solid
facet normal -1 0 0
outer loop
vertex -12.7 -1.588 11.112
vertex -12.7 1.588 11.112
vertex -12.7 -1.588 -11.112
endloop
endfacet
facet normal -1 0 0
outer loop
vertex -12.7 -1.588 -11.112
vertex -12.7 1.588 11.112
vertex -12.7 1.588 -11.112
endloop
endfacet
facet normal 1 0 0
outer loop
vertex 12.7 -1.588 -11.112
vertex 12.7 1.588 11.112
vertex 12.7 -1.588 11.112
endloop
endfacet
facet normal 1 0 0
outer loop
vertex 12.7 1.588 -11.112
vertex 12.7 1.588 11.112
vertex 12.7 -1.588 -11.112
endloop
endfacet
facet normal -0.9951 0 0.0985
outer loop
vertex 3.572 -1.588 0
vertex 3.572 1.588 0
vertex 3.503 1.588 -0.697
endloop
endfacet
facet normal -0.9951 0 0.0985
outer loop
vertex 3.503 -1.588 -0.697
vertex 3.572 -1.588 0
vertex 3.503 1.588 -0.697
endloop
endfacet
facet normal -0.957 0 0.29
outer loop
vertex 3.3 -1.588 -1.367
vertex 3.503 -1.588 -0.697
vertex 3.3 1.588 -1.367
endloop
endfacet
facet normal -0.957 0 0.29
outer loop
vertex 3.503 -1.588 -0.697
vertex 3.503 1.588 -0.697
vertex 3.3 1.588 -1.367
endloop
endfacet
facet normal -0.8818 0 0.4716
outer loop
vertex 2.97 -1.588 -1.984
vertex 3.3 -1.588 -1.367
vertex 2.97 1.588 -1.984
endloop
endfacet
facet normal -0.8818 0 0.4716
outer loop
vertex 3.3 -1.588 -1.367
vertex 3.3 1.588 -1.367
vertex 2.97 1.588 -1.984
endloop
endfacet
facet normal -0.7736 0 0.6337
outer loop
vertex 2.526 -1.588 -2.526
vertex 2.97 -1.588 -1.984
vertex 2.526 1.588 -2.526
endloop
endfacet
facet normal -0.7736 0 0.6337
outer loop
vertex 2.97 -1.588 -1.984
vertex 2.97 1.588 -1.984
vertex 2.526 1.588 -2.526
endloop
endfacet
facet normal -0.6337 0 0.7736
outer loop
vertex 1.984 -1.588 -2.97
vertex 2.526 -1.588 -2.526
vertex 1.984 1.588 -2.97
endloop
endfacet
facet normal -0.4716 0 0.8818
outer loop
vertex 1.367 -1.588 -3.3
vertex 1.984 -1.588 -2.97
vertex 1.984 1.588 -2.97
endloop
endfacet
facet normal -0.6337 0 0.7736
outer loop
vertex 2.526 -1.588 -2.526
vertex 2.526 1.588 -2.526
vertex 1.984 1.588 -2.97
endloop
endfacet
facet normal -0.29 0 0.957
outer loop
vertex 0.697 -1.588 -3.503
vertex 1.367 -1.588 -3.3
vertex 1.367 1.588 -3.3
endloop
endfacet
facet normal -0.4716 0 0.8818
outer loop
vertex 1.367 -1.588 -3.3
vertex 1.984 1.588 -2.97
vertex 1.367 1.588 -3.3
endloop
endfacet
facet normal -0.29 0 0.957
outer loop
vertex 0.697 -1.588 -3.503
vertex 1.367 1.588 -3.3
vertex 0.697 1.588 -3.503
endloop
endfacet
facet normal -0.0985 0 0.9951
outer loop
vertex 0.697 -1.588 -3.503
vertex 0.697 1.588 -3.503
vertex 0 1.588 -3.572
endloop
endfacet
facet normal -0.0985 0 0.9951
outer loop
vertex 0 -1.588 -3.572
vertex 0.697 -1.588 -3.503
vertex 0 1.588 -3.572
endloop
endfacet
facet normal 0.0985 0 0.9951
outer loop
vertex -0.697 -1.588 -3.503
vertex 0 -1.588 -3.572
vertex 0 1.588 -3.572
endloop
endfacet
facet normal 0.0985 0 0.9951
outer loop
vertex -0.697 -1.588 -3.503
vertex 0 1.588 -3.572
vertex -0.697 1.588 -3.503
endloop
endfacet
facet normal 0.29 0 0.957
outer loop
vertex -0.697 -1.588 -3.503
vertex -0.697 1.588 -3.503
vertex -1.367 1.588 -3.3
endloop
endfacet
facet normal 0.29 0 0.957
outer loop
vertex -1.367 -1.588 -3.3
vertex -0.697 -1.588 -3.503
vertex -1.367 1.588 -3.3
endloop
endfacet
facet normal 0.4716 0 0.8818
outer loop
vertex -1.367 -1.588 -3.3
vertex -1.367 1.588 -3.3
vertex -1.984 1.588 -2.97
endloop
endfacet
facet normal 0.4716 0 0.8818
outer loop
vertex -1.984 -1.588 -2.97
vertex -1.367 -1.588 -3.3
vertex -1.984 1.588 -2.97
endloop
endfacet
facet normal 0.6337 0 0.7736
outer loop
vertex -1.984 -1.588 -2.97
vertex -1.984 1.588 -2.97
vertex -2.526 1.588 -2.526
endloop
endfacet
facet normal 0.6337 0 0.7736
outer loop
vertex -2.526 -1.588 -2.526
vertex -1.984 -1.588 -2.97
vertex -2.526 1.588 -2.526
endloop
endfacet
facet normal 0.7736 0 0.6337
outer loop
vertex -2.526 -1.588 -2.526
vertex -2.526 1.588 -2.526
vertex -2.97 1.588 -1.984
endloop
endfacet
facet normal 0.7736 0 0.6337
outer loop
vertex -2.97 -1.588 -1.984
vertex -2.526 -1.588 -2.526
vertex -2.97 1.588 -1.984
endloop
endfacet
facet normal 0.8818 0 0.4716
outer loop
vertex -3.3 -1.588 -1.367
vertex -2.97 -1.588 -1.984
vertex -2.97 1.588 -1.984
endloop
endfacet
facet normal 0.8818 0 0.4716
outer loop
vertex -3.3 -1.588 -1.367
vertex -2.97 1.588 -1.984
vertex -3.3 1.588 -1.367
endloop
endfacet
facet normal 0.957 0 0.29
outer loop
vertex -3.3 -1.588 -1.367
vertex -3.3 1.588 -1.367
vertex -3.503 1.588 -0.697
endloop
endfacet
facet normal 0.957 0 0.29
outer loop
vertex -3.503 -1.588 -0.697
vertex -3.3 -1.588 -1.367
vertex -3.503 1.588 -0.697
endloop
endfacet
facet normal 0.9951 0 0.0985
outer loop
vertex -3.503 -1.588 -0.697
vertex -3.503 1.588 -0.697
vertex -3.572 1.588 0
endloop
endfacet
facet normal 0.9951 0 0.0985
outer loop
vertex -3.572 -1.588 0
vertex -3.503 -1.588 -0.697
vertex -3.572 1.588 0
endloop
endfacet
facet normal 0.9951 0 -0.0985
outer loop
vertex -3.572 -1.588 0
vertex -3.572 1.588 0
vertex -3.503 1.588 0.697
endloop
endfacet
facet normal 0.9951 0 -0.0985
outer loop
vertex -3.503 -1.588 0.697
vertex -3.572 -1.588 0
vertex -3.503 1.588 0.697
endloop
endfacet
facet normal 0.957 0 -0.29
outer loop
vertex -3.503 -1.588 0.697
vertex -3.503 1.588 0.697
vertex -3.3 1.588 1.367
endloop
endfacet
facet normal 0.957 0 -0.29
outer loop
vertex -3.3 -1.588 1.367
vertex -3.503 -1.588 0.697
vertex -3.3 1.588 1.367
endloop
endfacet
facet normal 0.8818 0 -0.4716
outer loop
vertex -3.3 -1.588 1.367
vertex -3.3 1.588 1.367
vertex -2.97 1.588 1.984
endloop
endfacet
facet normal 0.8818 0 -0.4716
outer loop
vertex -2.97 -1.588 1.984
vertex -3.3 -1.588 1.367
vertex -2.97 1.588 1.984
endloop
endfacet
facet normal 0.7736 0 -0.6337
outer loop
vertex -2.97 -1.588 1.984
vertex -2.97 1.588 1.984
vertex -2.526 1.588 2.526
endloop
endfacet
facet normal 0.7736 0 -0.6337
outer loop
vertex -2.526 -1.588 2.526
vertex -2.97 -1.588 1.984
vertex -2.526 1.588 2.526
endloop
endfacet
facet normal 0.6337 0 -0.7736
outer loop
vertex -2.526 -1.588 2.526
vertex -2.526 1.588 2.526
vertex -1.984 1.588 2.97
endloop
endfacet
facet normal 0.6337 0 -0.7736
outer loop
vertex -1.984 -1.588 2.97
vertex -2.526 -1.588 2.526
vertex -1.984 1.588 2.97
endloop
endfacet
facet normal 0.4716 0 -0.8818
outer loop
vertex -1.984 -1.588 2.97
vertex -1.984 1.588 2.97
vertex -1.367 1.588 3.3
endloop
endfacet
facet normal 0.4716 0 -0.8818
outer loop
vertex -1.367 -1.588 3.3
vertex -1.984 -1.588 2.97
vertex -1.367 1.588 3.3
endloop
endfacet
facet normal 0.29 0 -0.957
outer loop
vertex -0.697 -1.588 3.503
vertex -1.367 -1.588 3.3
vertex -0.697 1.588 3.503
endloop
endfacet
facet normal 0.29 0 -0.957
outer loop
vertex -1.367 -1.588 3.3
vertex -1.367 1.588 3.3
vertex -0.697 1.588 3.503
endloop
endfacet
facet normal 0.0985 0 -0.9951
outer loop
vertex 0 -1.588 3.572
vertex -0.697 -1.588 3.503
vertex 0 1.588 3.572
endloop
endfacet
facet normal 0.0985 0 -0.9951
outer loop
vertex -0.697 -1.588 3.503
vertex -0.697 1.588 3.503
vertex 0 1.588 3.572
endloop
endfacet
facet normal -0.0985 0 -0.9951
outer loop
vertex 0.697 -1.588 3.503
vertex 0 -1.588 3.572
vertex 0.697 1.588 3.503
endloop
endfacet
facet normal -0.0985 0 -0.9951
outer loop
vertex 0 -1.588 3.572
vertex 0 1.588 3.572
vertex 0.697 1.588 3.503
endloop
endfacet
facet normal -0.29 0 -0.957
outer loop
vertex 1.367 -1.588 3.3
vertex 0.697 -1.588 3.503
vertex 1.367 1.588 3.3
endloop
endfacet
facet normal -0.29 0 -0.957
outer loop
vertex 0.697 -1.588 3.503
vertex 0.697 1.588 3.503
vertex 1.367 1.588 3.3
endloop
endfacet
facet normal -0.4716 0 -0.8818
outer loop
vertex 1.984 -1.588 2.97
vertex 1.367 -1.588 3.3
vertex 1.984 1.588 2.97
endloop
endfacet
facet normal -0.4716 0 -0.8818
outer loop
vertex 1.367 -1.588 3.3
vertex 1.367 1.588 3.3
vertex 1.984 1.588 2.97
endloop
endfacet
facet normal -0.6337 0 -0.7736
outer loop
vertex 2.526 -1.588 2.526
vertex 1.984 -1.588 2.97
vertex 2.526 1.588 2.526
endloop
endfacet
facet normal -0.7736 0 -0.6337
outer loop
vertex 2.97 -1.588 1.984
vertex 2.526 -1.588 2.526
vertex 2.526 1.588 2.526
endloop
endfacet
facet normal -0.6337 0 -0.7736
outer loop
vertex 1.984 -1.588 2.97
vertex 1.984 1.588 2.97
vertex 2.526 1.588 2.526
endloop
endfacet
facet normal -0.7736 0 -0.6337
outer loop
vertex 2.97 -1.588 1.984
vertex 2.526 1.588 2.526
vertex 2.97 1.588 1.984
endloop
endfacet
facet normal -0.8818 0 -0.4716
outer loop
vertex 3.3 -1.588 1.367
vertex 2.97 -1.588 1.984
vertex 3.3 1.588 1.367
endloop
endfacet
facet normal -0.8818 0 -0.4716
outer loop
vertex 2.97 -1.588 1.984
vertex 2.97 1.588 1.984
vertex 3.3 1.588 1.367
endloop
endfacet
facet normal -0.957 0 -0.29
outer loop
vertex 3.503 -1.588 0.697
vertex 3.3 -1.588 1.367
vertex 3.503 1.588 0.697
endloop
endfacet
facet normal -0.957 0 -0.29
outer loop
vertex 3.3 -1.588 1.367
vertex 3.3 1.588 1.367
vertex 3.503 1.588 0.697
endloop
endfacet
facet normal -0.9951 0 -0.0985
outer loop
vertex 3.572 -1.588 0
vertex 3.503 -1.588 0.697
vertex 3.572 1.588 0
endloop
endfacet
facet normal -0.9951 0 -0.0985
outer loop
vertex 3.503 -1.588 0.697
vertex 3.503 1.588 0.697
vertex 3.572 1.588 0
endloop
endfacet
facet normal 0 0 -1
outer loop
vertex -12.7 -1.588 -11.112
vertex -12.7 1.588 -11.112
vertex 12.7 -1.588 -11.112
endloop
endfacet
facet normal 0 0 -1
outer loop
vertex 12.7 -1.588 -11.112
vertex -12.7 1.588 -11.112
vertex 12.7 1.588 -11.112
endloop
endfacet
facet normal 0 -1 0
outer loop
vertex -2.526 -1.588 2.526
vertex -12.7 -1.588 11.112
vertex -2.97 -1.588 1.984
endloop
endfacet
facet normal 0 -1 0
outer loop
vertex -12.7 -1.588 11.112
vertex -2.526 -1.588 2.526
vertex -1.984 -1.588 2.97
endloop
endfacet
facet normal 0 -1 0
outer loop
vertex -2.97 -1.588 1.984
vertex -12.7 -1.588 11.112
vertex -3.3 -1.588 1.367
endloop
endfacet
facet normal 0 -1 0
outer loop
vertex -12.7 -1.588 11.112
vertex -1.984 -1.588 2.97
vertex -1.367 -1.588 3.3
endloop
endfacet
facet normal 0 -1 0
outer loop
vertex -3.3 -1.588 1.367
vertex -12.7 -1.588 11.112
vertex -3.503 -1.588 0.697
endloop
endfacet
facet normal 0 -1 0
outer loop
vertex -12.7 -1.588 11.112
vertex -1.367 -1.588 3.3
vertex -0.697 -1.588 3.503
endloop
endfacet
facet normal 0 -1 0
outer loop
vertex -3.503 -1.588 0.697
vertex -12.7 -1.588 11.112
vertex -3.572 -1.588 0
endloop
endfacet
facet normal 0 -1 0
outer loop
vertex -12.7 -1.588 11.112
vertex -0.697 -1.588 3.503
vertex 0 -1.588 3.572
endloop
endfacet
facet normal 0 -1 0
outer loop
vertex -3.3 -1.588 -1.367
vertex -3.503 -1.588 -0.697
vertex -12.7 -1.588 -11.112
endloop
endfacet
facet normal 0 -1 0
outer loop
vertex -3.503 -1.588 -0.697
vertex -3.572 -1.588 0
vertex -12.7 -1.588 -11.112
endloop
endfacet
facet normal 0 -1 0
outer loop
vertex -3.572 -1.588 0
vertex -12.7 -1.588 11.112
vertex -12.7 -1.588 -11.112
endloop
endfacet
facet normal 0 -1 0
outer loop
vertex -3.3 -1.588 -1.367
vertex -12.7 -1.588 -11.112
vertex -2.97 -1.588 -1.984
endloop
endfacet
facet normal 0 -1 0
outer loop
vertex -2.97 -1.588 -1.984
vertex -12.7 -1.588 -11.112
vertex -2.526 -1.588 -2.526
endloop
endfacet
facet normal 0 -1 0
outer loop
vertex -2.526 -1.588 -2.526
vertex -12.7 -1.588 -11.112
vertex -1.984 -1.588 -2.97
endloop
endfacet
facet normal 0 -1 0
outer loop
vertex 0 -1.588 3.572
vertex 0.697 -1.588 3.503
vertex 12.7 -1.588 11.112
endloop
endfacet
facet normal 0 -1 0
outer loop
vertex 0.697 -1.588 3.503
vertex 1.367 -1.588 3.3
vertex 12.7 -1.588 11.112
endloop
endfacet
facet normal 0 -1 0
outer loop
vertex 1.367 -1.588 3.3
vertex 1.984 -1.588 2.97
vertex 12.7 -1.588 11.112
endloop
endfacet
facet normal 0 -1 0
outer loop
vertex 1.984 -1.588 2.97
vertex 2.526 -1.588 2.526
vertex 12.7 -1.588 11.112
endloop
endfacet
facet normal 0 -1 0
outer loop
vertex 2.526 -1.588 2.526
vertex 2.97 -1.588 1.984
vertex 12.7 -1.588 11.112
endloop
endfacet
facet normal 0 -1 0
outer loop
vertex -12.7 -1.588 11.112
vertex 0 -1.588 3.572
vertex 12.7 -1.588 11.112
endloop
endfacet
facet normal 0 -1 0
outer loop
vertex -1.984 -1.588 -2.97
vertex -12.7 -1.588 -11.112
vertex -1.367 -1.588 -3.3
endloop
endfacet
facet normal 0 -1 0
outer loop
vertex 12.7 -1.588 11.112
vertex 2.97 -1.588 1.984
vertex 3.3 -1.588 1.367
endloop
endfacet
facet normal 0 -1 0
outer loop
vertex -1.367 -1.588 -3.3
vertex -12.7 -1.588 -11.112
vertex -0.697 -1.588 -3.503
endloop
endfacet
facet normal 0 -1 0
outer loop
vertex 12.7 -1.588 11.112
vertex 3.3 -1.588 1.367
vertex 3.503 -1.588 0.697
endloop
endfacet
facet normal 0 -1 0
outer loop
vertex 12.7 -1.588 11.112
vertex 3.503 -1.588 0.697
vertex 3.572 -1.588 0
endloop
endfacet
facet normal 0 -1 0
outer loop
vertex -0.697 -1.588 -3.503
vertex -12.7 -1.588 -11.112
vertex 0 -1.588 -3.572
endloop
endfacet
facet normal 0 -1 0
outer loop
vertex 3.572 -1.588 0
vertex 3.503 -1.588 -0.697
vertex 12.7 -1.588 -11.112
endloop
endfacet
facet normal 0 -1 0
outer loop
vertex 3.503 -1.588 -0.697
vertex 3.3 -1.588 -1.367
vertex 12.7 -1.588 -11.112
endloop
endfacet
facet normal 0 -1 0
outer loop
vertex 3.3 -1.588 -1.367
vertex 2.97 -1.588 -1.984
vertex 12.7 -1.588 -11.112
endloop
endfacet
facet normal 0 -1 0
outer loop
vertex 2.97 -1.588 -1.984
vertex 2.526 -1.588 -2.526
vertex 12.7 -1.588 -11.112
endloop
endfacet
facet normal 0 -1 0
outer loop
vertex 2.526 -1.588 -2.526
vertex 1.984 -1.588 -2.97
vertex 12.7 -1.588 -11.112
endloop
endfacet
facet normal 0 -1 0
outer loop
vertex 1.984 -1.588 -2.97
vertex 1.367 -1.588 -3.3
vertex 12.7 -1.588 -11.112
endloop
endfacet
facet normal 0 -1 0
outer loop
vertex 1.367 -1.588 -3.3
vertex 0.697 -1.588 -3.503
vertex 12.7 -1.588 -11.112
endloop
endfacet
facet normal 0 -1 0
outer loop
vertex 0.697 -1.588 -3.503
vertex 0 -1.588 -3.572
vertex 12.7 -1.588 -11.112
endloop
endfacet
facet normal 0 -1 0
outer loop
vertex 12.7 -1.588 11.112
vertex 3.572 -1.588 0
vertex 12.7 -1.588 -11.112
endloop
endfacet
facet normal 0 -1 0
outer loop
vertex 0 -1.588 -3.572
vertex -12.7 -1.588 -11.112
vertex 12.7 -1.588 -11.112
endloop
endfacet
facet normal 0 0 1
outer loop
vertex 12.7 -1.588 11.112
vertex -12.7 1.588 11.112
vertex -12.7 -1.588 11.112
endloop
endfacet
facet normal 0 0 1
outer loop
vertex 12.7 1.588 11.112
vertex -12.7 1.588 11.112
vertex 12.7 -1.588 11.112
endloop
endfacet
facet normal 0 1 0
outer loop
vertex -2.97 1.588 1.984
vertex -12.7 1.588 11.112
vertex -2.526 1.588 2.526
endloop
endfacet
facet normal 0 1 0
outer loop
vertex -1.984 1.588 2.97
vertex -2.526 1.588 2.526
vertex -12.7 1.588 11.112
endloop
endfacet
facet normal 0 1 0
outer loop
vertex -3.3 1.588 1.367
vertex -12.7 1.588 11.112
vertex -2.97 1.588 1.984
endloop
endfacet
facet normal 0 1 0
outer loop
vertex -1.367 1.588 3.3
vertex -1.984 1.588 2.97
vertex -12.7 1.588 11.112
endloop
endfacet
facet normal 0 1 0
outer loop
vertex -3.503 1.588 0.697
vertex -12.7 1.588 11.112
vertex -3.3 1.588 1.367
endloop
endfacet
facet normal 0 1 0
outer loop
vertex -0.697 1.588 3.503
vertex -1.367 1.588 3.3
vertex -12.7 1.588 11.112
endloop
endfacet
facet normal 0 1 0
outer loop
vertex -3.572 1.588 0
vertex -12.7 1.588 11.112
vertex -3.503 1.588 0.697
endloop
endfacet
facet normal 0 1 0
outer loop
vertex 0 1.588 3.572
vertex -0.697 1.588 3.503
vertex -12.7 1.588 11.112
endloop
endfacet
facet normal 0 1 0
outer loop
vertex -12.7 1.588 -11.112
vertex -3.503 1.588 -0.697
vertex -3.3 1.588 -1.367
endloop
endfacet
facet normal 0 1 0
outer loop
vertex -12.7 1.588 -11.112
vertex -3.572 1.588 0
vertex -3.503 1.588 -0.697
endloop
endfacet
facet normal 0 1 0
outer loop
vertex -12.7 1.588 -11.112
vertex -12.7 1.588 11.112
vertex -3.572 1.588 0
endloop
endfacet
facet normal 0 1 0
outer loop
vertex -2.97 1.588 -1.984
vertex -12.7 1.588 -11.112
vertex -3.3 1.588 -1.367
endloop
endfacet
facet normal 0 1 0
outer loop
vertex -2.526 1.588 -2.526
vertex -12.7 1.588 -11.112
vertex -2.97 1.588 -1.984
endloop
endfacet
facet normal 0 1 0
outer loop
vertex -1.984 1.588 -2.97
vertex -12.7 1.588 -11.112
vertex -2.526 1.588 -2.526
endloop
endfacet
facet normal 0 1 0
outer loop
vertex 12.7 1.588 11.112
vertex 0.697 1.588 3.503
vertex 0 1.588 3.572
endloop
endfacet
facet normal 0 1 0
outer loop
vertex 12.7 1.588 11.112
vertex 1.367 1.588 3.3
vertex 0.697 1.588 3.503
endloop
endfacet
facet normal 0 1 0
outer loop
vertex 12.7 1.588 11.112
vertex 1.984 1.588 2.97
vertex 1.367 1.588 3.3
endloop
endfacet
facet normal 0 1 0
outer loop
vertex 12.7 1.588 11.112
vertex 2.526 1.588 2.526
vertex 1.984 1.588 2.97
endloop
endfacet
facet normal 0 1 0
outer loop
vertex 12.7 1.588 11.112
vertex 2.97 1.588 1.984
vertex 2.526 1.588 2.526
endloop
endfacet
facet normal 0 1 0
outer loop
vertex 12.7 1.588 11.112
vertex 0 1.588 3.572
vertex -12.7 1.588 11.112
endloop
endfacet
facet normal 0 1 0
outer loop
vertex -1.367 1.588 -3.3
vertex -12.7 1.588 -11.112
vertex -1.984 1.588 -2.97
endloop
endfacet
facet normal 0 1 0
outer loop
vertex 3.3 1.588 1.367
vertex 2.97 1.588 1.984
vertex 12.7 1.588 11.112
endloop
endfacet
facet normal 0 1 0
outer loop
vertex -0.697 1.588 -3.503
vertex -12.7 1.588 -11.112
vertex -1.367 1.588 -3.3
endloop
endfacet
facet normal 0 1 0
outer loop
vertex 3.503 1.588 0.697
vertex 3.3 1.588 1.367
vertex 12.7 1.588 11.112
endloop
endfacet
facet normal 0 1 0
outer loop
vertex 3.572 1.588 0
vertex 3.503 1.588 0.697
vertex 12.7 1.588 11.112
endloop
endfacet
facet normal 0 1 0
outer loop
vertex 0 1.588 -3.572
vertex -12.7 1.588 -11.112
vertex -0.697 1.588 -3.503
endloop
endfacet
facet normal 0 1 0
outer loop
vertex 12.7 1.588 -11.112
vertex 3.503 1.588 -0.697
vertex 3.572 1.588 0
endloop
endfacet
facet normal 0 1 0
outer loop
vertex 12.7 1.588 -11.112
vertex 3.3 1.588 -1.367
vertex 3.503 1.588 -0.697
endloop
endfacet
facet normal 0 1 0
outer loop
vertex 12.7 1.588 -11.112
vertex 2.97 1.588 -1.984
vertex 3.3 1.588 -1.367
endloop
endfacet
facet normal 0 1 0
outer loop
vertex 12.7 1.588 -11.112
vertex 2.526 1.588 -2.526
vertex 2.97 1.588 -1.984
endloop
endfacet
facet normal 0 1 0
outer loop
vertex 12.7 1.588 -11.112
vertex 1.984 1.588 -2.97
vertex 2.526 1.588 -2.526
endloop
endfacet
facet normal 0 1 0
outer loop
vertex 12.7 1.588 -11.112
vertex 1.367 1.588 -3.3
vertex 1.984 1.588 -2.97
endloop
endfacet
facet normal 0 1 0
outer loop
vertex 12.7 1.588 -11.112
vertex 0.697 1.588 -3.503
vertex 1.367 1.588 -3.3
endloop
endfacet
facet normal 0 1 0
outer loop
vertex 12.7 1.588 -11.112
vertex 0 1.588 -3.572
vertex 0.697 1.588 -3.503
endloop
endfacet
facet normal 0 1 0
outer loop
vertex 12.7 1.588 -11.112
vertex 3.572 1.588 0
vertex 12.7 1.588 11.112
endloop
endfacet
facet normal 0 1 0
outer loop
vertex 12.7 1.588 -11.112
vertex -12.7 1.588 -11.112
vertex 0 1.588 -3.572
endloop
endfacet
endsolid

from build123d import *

# Parameters (mm, degrees)
SKETCH1_W          = 25.4
SKETCH1_H          = 22.225
EXTRUDE1_DEPTH     = 1.5875
SKETCH2_R          = 3.571875
CUT_EXTRUDE1_DEPTH = 4.175


with BuildPart() as part:
    # Sketch1 → Extrude1 (new body, symmetric)
    with BuildSketch(Plane(origin=(0, 0, 0), x_dir=(1, 0, 0), z_dir=(0, 1, 0))):
        Rectangle(SKETCH1_W, SKETCH1_H)
    extrude(amount=EXTRUDE1_DEPTH, both=True)

    # Sketch2 → Cut-Extrude1 (cut, through all)
    with BuildSketch(Plane(origin=(0, 1.5875, 0), x_dir=(1, 0, 0), z_dir=(0, 1, 0))):
        Circle(SKETCH2_R)
    extrude(amount=-CUT_EXTRUDE1_DEPTH, mode=Mode.SUBTRACT)


solid = part.part
